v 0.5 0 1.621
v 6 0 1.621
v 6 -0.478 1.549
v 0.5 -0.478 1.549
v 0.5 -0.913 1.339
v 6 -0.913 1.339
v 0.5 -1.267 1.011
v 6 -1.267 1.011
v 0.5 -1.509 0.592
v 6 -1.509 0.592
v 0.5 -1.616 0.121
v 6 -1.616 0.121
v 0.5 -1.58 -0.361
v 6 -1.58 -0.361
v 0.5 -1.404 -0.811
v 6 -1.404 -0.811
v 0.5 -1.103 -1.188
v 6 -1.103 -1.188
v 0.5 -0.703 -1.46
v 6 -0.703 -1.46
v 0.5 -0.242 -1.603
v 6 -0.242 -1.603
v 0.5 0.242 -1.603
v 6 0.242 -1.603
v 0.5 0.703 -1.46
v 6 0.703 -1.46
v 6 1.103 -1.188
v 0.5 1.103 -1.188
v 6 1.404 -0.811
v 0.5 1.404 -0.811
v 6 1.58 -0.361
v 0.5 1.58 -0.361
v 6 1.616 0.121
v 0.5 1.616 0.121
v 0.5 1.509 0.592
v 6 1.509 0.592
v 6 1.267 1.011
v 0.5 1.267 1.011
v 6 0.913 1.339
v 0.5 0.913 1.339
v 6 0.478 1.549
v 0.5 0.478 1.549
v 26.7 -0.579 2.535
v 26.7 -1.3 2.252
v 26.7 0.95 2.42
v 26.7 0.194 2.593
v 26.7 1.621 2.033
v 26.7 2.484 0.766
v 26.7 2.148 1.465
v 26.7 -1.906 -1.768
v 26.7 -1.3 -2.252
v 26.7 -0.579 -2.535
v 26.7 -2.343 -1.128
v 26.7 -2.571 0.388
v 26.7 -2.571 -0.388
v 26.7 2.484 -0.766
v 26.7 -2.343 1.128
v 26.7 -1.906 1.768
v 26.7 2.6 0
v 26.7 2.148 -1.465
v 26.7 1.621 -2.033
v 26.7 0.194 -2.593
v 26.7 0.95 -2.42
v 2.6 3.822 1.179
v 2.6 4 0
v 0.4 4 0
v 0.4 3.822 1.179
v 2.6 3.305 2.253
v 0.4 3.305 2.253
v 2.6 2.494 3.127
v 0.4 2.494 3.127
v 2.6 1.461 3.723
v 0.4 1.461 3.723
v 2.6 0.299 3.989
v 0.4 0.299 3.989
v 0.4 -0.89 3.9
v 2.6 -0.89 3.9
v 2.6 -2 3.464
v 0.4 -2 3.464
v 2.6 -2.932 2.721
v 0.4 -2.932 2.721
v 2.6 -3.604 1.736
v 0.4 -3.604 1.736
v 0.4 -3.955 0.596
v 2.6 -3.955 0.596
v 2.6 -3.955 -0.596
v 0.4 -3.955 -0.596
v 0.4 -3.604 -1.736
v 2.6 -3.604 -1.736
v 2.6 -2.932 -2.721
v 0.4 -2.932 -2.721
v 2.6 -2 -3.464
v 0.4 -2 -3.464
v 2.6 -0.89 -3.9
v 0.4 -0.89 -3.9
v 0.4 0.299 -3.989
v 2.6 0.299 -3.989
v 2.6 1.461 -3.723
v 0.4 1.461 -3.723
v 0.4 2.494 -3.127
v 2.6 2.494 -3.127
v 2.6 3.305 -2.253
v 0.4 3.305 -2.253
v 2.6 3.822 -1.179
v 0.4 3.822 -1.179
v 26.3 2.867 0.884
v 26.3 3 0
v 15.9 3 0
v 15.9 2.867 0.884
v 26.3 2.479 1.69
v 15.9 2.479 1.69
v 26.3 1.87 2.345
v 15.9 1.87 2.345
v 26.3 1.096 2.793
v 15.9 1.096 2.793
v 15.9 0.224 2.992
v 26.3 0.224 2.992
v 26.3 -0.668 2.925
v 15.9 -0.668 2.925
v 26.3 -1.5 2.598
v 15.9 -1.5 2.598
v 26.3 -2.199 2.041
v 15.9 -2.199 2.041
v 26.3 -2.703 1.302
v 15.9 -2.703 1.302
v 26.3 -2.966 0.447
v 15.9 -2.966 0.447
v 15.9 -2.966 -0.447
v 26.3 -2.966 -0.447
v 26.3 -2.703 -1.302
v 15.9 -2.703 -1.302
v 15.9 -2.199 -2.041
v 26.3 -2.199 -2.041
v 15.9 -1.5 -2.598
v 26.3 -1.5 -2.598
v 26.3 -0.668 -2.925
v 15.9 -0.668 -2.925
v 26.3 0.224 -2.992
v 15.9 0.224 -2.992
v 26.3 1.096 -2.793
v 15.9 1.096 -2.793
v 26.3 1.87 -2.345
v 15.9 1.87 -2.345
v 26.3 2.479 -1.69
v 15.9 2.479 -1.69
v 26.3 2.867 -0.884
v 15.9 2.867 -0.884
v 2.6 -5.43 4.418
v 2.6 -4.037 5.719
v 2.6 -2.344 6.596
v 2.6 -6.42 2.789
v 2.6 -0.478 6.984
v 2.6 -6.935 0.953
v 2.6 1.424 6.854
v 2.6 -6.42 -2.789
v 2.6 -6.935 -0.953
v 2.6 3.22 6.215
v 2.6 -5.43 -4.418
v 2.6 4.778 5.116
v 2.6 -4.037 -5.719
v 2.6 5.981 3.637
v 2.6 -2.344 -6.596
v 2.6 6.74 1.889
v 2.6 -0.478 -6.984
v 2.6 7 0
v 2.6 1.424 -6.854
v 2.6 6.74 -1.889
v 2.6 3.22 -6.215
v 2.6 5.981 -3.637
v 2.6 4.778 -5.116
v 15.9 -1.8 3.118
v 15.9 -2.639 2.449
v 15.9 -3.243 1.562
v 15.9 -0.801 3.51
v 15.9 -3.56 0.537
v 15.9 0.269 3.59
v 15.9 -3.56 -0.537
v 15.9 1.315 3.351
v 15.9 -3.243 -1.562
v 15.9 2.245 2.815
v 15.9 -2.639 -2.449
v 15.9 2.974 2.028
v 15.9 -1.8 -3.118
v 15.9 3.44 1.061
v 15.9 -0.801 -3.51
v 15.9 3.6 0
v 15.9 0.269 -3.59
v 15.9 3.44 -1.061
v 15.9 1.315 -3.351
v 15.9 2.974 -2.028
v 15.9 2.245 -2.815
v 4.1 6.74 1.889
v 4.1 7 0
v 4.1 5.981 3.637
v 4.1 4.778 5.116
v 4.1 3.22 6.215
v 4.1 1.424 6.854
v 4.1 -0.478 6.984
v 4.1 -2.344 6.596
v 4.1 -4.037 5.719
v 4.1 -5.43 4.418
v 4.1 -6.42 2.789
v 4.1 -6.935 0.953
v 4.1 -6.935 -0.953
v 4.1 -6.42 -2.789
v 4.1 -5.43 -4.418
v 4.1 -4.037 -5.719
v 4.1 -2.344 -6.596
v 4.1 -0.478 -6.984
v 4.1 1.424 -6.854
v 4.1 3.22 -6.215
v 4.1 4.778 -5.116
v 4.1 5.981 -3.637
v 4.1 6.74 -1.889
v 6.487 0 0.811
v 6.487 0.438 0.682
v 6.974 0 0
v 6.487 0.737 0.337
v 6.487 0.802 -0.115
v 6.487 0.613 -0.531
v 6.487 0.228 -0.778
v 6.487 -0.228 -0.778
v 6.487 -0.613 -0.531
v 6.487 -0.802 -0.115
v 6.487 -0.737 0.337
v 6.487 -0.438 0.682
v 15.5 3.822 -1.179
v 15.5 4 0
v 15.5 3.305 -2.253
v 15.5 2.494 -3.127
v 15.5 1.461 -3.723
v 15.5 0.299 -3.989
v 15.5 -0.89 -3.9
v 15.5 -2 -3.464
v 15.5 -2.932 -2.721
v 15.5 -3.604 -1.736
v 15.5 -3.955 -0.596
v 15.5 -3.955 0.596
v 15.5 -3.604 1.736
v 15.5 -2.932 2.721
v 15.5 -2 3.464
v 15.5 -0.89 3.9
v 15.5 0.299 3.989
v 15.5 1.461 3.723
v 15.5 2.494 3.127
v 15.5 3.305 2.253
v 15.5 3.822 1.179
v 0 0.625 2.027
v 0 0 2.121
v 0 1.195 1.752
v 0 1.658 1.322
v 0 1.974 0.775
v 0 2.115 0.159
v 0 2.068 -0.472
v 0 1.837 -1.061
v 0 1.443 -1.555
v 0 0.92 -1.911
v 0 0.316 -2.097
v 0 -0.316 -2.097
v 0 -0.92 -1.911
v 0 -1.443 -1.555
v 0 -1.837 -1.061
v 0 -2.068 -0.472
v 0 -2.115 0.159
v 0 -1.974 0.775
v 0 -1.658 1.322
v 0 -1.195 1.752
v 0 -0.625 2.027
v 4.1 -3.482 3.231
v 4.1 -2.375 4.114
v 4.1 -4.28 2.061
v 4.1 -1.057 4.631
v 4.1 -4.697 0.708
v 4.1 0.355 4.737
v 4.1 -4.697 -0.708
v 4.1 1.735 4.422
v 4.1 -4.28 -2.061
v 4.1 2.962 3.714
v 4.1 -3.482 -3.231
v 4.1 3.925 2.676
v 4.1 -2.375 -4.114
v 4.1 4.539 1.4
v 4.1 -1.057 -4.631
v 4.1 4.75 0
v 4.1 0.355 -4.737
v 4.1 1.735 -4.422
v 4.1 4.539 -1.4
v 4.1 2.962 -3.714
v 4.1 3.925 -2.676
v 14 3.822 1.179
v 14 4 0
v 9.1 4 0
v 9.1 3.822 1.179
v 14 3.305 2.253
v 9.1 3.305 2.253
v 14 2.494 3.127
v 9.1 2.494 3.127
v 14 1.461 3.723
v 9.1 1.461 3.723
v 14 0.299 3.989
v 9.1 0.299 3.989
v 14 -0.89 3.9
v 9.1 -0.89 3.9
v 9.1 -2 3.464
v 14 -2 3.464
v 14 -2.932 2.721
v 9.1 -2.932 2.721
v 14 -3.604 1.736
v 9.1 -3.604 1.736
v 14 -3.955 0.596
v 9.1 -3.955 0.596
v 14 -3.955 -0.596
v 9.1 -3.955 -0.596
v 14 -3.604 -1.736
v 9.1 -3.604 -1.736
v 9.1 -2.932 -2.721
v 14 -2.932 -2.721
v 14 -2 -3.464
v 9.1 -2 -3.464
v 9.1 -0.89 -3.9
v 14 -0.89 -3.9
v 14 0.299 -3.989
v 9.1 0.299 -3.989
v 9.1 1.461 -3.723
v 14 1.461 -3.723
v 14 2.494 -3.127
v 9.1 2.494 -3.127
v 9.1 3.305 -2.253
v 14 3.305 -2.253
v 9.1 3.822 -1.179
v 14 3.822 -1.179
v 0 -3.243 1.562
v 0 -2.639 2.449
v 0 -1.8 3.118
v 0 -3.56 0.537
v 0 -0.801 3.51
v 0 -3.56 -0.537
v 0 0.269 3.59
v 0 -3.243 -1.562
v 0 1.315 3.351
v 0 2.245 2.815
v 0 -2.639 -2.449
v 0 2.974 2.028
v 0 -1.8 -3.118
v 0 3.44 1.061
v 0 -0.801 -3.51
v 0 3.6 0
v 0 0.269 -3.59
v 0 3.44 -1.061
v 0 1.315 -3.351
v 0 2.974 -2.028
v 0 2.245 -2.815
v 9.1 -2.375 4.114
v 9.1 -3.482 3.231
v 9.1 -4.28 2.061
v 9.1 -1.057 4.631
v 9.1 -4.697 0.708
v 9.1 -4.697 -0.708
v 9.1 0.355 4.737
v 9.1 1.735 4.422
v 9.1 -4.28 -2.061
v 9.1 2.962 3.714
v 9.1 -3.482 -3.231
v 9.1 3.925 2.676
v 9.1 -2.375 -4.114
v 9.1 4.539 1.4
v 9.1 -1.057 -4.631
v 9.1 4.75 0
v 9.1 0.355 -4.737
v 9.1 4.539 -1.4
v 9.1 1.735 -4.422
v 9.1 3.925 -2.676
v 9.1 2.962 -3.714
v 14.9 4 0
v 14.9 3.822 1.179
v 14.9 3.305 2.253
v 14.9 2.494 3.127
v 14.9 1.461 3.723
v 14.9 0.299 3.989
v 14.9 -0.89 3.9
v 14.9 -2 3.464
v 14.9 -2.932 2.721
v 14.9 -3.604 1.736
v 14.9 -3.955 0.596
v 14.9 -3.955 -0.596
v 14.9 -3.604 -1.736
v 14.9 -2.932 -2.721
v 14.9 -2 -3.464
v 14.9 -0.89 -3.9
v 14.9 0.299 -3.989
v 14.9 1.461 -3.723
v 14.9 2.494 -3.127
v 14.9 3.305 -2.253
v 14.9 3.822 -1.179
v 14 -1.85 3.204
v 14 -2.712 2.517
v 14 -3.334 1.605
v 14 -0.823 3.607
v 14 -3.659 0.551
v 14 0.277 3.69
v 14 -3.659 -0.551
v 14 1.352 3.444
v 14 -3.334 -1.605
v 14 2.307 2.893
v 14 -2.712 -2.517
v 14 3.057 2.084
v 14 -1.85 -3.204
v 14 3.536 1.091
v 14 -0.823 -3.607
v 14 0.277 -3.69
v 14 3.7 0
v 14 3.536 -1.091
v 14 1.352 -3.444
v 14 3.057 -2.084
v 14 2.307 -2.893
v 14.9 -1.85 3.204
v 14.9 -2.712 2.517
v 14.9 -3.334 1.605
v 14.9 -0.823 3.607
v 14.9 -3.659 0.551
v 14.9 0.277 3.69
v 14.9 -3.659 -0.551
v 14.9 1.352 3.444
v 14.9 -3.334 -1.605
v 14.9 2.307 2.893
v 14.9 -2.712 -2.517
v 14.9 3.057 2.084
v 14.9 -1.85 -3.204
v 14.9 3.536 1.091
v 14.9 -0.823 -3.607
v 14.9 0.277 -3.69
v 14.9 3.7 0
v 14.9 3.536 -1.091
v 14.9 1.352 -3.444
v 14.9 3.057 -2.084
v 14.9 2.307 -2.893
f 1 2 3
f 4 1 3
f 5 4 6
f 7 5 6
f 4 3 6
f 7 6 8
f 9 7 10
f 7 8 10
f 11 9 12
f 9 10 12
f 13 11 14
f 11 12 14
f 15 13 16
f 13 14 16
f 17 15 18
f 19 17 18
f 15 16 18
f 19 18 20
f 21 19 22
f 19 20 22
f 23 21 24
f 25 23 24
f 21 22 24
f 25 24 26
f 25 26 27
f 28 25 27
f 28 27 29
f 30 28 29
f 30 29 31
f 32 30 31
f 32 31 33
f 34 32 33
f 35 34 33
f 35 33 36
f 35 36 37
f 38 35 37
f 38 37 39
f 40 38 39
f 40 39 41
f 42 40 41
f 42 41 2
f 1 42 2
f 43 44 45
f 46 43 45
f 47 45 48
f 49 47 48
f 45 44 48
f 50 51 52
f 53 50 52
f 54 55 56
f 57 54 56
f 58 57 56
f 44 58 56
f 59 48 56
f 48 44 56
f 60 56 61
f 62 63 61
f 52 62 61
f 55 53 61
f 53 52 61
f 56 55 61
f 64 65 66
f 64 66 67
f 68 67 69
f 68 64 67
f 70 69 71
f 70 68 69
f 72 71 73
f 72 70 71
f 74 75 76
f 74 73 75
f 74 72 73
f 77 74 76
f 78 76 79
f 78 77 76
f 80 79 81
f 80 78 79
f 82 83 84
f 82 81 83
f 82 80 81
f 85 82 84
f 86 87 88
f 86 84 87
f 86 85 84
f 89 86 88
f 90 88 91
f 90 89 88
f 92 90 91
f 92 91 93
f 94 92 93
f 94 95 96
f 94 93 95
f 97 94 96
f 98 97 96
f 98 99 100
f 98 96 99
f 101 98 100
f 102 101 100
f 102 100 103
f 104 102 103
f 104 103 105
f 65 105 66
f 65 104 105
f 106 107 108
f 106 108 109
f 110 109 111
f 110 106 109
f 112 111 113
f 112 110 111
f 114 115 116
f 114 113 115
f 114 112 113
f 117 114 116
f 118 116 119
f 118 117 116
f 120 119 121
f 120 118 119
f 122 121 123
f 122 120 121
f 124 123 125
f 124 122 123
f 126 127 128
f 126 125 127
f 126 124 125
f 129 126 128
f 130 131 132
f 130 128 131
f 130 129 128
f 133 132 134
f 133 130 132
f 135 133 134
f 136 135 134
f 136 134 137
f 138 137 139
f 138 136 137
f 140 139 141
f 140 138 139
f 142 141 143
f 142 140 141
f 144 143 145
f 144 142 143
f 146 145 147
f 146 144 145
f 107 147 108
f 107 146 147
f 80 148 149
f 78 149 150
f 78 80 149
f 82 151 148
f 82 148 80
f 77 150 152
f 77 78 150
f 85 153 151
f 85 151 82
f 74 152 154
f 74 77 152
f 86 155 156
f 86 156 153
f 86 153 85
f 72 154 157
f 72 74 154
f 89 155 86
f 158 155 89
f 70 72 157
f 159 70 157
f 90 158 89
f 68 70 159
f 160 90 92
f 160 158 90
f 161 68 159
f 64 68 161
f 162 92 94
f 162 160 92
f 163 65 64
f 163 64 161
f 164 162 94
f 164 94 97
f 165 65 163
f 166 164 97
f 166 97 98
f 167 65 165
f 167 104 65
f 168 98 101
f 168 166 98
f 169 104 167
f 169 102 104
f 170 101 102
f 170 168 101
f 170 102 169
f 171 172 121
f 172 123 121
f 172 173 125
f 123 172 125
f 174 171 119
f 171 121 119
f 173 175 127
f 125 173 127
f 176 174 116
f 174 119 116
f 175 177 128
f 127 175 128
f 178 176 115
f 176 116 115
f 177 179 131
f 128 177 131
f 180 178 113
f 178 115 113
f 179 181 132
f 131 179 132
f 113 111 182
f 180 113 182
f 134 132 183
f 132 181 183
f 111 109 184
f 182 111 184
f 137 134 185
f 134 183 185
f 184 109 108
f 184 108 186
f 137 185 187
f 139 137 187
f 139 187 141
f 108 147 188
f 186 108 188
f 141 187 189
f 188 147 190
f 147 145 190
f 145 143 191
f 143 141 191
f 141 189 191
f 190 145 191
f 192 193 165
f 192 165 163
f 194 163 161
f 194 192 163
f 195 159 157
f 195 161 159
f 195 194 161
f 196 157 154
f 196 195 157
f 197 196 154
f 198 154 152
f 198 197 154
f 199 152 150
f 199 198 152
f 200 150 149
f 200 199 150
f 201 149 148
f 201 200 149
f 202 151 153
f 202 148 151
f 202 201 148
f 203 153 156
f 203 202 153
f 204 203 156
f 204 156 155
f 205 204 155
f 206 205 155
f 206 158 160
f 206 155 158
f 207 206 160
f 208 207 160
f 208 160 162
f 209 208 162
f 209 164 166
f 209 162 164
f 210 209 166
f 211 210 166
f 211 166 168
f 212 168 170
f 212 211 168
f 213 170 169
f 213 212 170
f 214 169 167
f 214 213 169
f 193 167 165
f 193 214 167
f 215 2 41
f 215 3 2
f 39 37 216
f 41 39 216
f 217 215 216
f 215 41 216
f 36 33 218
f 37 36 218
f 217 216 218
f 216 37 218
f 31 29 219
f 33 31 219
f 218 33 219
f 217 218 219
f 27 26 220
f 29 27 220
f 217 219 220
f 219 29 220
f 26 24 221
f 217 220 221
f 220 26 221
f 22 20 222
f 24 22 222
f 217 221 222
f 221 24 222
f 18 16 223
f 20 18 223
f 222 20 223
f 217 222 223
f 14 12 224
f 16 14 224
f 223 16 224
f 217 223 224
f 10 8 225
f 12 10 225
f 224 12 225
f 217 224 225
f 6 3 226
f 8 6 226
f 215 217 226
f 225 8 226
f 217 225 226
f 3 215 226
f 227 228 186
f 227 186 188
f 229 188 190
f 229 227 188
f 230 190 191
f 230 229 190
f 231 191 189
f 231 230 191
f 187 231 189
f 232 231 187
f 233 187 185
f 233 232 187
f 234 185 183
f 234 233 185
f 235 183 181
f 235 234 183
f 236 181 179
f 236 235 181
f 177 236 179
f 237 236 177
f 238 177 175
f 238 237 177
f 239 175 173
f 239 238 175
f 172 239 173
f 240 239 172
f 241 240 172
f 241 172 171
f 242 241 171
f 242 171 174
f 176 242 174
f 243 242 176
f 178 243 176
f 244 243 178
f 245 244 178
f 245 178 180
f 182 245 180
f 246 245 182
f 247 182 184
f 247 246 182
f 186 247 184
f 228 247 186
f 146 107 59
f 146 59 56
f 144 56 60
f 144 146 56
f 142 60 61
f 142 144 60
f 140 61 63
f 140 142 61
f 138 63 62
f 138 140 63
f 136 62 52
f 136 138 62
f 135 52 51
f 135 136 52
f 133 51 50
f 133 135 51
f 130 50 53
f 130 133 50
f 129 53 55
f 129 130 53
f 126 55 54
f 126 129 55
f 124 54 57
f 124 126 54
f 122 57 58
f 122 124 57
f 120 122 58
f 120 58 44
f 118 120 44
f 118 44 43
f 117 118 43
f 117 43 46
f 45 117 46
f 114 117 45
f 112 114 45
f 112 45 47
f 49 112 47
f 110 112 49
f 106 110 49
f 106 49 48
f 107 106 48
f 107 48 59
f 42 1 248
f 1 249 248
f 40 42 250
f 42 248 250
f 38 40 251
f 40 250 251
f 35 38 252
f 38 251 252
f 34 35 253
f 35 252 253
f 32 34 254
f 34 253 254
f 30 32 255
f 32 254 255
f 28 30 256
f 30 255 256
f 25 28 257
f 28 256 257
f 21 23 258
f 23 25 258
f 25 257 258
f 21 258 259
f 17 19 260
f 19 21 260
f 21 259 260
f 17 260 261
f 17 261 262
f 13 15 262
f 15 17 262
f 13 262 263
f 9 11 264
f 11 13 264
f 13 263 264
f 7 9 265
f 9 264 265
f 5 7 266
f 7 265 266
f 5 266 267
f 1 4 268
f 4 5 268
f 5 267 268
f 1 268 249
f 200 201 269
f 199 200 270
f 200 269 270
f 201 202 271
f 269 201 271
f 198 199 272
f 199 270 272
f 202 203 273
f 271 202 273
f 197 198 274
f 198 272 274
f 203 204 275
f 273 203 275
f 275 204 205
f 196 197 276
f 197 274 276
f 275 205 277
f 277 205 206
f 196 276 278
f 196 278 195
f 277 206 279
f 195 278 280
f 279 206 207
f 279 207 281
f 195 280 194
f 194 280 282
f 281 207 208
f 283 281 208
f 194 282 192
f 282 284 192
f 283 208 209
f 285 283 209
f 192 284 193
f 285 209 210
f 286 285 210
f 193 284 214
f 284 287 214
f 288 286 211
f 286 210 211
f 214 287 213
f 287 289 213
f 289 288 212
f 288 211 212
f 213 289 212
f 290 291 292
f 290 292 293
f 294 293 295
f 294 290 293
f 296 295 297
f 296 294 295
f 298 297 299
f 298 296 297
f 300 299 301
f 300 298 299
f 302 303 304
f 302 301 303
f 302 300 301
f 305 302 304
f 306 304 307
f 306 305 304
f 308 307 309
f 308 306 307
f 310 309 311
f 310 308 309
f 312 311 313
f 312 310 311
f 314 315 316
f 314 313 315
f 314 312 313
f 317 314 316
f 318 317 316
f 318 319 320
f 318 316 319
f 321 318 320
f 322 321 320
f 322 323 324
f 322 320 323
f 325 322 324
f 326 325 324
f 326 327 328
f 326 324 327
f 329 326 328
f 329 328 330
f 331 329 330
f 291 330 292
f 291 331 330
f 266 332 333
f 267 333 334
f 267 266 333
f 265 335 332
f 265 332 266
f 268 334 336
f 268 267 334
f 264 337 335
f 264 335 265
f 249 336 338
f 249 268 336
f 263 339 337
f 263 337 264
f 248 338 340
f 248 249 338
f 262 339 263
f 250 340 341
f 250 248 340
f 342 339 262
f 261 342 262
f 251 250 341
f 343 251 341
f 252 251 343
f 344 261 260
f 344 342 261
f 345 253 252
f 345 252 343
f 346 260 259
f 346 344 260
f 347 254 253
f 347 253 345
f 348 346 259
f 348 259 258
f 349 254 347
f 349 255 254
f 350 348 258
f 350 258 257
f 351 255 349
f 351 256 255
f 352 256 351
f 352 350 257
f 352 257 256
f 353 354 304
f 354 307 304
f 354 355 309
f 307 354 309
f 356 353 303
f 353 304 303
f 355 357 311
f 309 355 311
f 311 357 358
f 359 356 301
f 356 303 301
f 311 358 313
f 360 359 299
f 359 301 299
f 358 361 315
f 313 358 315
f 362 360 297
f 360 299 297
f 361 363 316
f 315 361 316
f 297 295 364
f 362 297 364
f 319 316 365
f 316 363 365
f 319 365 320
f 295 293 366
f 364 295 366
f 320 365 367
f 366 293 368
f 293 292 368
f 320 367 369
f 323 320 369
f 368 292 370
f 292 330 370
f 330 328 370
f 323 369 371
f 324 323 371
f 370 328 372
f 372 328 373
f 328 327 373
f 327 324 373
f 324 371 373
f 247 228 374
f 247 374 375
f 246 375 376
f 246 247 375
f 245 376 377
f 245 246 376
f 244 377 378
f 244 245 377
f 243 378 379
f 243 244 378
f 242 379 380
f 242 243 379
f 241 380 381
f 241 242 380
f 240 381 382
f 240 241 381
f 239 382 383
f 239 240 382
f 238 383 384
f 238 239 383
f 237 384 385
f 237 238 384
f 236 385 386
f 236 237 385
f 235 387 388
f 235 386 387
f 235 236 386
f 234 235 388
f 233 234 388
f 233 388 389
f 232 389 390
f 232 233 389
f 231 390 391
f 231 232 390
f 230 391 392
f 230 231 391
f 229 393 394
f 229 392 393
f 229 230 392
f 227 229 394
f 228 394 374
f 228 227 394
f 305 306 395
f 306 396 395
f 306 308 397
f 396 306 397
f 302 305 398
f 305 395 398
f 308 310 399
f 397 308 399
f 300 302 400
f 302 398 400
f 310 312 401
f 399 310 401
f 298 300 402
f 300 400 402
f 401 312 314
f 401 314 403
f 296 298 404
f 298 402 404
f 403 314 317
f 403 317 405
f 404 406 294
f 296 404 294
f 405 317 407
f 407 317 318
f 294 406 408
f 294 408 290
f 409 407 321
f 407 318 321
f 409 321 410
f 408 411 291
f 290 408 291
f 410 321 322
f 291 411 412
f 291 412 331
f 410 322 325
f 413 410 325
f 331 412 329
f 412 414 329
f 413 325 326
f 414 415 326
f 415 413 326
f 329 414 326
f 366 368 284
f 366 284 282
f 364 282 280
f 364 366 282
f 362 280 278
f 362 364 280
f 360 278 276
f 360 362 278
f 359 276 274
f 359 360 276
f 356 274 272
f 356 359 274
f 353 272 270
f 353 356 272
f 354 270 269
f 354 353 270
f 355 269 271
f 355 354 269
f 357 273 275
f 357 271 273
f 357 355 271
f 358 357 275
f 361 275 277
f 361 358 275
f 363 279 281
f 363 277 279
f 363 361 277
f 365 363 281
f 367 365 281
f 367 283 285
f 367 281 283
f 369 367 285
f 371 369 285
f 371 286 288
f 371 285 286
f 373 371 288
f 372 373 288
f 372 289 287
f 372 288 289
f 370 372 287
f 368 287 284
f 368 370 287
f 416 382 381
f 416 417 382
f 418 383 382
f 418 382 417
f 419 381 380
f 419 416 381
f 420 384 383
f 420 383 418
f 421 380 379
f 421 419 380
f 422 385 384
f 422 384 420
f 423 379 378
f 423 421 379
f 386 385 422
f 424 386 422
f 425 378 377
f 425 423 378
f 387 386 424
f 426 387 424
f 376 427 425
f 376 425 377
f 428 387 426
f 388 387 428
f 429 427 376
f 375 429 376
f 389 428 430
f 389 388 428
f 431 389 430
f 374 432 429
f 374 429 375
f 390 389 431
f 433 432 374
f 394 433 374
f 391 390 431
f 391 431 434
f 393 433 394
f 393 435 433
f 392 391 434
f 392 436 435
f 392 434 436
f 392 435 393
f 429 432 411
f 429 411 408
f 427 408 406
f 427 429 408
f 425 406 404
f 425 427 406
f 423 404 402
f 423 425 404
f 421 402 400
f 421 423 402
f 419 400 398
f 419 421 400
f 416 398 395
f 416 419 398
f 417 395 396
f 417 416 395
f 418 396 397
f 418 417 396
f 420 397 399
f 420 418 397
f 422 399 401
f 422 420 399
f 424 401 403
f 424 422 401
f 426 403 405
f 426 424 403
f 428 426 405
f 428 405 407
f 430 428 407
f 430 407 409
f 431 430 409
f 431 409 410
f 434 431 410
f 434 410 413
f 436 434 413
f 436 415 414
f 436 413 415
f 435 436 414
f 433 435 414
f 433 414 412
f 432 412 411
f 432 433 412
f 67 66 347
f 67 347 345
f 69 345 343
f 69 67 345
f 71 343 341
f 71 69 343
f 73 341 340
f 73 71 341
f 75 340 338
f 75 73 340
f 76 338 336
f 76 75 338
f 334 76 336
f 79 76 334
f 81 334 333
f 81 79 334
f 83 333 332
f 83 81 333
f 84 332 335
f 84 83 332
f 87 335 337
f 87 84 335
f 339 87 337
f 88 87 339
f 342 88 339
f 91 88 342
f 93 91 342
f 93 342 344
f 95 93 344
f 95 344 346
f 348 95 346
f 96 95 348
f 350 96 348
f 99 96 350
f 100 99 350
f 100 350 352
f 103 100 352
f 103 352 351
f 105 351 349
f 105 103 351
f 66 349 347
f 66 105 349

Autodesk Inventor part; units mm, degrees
ref_plane "YZ Plane" through (0, 0, 0) normal (1, 0, 0) x (0, 1, 0)
ref_plane "XZ Plane" through (0, 0, 0) normal (0, 1, 0) x (-1, 0, 0)
sketch "Sketch1" plane through (0, 0, 0) normal (0, 0, 1) x (1, 0, 0)
  line L0 (15.9, 4) -> (15.9, 3)
  line L1 (15.9, 3) -> (26.7, 3)
  line L2 (26.7, 3) -> (26.7, 0)
  line L3 (26.7, 0) -> (0, 0)
  line L4 (0, 0) -> (0, 4)
  line L5 (4.1, 4.75) -> (9.1, 4.75)
  line L6 (9.1, 4.75) -> (9.1, 4)
  line L7 (0, 4) -> (2.6, 4)
  line L8 (14, 4) -> (14, 3.7)
  line L9 (14, 3.7) -> (14.9, 3.7)
  line L10 (14.9, 3.7) -> (14.9, 4)
  line L11 (9.1, 4) -> (14, 4)
  line L12 (14.9, 4) -> (15.9, 4)
  line L13 (14.1, 4) -> (14.1, 0) construction
  line L14 (4.1, 4.75) -> (4.1, 0) construction
  line L15 (16.7, 3) -> (16.7, 0) construction
  line L16 (18.2, 3) -> (18.2, 0) construction
  line L17 (2.6, 4) -> (2.6, 7)
  line L18 (2.6, 7) -> (4.1, 7)
  line L19 (4.1, 7) -> (4.1, 4.75)
  line L20 (9.1, 4) -> (9.1, 0) construction
  line L21 (6.1, 4.75) -> (6.1, 0) construction
  dimension "d0" = 6
  dimension "d2" = 9.5
  dimension "d3" = 8
  dimension "d7" = 0.9
  dimension "d8" = 7.4
  dimension "d9" = 1
  dimension "Cover_MountingPlate_Thickness" = 1.5
  dimension "d23" = 0.8
  dimension "MountingPlate_MEnc_Distance" = 14.1
  dimension "d25" = 8.5
  dimension "d29" = 14
  dimension "d31" = 1.5
  dimension "d32" = 2.6
  dimension "d33" = 0.1
  dimension "d34" = 5
  dimension "d35" = 8
  dimension "d36" = 2
revolve "Revolution1" add sketch "Sketch1" angle 360 about axis through (26.7, 0, 0) along (-1, 0, 0)
chamfer "Chamfer1" distance 0.4 angle 45 3 edges at (0, -4, 0) (26.7, -3, 0) (15.9, -4, 0)
ref_plane "Work Plane4" through (26.7, 0, 0) normal (1, 0, 0) x (0, 0, -1)
ref_plane "Work Plane3" through (18.2, 0, 0) normal (1, 0, 0) x (0, 0, -1)
sketch "Sketch2" plane through (0, 0, 0) normal (-1, 0, 0) x (0, 0, 1)
  point P0 (0, 0)
  point P1 (0, 0)
hole "Hole1" at (0, 0, 0) direction (1, 0, 0) diameter 3.242 depth 6 tip angle 118 thread size "M4x0.7" class "6H" standard "ISO Metric profile"
chamfer "Chamfer2" distance 0.5 angle 45 1 edges at (0, 0, -1.621)
ref_plane "Work Plane2" through (16.7, 0, 0) normal (1, 0, 0) x (0, 0, -1)
equation "\"d35\" = ShaftFixation_UpperLower_Height"
equation "\"d36\" = BasePlate_UpperLowerConnector_Height"
equation "\"d18\" = d23"
equation "\"d19\" = Cover_MountingPlate_Thickness"
equation "\"d20\" = d25"
equation "\"ShaftFixation_UpperLower_Height\" = 8"
equation "\"BasePlate_UpperLowerConnector_Height\" = 2"
properties part number "UpperLowerArm_JointShaft" material "Aluminum 6061"
